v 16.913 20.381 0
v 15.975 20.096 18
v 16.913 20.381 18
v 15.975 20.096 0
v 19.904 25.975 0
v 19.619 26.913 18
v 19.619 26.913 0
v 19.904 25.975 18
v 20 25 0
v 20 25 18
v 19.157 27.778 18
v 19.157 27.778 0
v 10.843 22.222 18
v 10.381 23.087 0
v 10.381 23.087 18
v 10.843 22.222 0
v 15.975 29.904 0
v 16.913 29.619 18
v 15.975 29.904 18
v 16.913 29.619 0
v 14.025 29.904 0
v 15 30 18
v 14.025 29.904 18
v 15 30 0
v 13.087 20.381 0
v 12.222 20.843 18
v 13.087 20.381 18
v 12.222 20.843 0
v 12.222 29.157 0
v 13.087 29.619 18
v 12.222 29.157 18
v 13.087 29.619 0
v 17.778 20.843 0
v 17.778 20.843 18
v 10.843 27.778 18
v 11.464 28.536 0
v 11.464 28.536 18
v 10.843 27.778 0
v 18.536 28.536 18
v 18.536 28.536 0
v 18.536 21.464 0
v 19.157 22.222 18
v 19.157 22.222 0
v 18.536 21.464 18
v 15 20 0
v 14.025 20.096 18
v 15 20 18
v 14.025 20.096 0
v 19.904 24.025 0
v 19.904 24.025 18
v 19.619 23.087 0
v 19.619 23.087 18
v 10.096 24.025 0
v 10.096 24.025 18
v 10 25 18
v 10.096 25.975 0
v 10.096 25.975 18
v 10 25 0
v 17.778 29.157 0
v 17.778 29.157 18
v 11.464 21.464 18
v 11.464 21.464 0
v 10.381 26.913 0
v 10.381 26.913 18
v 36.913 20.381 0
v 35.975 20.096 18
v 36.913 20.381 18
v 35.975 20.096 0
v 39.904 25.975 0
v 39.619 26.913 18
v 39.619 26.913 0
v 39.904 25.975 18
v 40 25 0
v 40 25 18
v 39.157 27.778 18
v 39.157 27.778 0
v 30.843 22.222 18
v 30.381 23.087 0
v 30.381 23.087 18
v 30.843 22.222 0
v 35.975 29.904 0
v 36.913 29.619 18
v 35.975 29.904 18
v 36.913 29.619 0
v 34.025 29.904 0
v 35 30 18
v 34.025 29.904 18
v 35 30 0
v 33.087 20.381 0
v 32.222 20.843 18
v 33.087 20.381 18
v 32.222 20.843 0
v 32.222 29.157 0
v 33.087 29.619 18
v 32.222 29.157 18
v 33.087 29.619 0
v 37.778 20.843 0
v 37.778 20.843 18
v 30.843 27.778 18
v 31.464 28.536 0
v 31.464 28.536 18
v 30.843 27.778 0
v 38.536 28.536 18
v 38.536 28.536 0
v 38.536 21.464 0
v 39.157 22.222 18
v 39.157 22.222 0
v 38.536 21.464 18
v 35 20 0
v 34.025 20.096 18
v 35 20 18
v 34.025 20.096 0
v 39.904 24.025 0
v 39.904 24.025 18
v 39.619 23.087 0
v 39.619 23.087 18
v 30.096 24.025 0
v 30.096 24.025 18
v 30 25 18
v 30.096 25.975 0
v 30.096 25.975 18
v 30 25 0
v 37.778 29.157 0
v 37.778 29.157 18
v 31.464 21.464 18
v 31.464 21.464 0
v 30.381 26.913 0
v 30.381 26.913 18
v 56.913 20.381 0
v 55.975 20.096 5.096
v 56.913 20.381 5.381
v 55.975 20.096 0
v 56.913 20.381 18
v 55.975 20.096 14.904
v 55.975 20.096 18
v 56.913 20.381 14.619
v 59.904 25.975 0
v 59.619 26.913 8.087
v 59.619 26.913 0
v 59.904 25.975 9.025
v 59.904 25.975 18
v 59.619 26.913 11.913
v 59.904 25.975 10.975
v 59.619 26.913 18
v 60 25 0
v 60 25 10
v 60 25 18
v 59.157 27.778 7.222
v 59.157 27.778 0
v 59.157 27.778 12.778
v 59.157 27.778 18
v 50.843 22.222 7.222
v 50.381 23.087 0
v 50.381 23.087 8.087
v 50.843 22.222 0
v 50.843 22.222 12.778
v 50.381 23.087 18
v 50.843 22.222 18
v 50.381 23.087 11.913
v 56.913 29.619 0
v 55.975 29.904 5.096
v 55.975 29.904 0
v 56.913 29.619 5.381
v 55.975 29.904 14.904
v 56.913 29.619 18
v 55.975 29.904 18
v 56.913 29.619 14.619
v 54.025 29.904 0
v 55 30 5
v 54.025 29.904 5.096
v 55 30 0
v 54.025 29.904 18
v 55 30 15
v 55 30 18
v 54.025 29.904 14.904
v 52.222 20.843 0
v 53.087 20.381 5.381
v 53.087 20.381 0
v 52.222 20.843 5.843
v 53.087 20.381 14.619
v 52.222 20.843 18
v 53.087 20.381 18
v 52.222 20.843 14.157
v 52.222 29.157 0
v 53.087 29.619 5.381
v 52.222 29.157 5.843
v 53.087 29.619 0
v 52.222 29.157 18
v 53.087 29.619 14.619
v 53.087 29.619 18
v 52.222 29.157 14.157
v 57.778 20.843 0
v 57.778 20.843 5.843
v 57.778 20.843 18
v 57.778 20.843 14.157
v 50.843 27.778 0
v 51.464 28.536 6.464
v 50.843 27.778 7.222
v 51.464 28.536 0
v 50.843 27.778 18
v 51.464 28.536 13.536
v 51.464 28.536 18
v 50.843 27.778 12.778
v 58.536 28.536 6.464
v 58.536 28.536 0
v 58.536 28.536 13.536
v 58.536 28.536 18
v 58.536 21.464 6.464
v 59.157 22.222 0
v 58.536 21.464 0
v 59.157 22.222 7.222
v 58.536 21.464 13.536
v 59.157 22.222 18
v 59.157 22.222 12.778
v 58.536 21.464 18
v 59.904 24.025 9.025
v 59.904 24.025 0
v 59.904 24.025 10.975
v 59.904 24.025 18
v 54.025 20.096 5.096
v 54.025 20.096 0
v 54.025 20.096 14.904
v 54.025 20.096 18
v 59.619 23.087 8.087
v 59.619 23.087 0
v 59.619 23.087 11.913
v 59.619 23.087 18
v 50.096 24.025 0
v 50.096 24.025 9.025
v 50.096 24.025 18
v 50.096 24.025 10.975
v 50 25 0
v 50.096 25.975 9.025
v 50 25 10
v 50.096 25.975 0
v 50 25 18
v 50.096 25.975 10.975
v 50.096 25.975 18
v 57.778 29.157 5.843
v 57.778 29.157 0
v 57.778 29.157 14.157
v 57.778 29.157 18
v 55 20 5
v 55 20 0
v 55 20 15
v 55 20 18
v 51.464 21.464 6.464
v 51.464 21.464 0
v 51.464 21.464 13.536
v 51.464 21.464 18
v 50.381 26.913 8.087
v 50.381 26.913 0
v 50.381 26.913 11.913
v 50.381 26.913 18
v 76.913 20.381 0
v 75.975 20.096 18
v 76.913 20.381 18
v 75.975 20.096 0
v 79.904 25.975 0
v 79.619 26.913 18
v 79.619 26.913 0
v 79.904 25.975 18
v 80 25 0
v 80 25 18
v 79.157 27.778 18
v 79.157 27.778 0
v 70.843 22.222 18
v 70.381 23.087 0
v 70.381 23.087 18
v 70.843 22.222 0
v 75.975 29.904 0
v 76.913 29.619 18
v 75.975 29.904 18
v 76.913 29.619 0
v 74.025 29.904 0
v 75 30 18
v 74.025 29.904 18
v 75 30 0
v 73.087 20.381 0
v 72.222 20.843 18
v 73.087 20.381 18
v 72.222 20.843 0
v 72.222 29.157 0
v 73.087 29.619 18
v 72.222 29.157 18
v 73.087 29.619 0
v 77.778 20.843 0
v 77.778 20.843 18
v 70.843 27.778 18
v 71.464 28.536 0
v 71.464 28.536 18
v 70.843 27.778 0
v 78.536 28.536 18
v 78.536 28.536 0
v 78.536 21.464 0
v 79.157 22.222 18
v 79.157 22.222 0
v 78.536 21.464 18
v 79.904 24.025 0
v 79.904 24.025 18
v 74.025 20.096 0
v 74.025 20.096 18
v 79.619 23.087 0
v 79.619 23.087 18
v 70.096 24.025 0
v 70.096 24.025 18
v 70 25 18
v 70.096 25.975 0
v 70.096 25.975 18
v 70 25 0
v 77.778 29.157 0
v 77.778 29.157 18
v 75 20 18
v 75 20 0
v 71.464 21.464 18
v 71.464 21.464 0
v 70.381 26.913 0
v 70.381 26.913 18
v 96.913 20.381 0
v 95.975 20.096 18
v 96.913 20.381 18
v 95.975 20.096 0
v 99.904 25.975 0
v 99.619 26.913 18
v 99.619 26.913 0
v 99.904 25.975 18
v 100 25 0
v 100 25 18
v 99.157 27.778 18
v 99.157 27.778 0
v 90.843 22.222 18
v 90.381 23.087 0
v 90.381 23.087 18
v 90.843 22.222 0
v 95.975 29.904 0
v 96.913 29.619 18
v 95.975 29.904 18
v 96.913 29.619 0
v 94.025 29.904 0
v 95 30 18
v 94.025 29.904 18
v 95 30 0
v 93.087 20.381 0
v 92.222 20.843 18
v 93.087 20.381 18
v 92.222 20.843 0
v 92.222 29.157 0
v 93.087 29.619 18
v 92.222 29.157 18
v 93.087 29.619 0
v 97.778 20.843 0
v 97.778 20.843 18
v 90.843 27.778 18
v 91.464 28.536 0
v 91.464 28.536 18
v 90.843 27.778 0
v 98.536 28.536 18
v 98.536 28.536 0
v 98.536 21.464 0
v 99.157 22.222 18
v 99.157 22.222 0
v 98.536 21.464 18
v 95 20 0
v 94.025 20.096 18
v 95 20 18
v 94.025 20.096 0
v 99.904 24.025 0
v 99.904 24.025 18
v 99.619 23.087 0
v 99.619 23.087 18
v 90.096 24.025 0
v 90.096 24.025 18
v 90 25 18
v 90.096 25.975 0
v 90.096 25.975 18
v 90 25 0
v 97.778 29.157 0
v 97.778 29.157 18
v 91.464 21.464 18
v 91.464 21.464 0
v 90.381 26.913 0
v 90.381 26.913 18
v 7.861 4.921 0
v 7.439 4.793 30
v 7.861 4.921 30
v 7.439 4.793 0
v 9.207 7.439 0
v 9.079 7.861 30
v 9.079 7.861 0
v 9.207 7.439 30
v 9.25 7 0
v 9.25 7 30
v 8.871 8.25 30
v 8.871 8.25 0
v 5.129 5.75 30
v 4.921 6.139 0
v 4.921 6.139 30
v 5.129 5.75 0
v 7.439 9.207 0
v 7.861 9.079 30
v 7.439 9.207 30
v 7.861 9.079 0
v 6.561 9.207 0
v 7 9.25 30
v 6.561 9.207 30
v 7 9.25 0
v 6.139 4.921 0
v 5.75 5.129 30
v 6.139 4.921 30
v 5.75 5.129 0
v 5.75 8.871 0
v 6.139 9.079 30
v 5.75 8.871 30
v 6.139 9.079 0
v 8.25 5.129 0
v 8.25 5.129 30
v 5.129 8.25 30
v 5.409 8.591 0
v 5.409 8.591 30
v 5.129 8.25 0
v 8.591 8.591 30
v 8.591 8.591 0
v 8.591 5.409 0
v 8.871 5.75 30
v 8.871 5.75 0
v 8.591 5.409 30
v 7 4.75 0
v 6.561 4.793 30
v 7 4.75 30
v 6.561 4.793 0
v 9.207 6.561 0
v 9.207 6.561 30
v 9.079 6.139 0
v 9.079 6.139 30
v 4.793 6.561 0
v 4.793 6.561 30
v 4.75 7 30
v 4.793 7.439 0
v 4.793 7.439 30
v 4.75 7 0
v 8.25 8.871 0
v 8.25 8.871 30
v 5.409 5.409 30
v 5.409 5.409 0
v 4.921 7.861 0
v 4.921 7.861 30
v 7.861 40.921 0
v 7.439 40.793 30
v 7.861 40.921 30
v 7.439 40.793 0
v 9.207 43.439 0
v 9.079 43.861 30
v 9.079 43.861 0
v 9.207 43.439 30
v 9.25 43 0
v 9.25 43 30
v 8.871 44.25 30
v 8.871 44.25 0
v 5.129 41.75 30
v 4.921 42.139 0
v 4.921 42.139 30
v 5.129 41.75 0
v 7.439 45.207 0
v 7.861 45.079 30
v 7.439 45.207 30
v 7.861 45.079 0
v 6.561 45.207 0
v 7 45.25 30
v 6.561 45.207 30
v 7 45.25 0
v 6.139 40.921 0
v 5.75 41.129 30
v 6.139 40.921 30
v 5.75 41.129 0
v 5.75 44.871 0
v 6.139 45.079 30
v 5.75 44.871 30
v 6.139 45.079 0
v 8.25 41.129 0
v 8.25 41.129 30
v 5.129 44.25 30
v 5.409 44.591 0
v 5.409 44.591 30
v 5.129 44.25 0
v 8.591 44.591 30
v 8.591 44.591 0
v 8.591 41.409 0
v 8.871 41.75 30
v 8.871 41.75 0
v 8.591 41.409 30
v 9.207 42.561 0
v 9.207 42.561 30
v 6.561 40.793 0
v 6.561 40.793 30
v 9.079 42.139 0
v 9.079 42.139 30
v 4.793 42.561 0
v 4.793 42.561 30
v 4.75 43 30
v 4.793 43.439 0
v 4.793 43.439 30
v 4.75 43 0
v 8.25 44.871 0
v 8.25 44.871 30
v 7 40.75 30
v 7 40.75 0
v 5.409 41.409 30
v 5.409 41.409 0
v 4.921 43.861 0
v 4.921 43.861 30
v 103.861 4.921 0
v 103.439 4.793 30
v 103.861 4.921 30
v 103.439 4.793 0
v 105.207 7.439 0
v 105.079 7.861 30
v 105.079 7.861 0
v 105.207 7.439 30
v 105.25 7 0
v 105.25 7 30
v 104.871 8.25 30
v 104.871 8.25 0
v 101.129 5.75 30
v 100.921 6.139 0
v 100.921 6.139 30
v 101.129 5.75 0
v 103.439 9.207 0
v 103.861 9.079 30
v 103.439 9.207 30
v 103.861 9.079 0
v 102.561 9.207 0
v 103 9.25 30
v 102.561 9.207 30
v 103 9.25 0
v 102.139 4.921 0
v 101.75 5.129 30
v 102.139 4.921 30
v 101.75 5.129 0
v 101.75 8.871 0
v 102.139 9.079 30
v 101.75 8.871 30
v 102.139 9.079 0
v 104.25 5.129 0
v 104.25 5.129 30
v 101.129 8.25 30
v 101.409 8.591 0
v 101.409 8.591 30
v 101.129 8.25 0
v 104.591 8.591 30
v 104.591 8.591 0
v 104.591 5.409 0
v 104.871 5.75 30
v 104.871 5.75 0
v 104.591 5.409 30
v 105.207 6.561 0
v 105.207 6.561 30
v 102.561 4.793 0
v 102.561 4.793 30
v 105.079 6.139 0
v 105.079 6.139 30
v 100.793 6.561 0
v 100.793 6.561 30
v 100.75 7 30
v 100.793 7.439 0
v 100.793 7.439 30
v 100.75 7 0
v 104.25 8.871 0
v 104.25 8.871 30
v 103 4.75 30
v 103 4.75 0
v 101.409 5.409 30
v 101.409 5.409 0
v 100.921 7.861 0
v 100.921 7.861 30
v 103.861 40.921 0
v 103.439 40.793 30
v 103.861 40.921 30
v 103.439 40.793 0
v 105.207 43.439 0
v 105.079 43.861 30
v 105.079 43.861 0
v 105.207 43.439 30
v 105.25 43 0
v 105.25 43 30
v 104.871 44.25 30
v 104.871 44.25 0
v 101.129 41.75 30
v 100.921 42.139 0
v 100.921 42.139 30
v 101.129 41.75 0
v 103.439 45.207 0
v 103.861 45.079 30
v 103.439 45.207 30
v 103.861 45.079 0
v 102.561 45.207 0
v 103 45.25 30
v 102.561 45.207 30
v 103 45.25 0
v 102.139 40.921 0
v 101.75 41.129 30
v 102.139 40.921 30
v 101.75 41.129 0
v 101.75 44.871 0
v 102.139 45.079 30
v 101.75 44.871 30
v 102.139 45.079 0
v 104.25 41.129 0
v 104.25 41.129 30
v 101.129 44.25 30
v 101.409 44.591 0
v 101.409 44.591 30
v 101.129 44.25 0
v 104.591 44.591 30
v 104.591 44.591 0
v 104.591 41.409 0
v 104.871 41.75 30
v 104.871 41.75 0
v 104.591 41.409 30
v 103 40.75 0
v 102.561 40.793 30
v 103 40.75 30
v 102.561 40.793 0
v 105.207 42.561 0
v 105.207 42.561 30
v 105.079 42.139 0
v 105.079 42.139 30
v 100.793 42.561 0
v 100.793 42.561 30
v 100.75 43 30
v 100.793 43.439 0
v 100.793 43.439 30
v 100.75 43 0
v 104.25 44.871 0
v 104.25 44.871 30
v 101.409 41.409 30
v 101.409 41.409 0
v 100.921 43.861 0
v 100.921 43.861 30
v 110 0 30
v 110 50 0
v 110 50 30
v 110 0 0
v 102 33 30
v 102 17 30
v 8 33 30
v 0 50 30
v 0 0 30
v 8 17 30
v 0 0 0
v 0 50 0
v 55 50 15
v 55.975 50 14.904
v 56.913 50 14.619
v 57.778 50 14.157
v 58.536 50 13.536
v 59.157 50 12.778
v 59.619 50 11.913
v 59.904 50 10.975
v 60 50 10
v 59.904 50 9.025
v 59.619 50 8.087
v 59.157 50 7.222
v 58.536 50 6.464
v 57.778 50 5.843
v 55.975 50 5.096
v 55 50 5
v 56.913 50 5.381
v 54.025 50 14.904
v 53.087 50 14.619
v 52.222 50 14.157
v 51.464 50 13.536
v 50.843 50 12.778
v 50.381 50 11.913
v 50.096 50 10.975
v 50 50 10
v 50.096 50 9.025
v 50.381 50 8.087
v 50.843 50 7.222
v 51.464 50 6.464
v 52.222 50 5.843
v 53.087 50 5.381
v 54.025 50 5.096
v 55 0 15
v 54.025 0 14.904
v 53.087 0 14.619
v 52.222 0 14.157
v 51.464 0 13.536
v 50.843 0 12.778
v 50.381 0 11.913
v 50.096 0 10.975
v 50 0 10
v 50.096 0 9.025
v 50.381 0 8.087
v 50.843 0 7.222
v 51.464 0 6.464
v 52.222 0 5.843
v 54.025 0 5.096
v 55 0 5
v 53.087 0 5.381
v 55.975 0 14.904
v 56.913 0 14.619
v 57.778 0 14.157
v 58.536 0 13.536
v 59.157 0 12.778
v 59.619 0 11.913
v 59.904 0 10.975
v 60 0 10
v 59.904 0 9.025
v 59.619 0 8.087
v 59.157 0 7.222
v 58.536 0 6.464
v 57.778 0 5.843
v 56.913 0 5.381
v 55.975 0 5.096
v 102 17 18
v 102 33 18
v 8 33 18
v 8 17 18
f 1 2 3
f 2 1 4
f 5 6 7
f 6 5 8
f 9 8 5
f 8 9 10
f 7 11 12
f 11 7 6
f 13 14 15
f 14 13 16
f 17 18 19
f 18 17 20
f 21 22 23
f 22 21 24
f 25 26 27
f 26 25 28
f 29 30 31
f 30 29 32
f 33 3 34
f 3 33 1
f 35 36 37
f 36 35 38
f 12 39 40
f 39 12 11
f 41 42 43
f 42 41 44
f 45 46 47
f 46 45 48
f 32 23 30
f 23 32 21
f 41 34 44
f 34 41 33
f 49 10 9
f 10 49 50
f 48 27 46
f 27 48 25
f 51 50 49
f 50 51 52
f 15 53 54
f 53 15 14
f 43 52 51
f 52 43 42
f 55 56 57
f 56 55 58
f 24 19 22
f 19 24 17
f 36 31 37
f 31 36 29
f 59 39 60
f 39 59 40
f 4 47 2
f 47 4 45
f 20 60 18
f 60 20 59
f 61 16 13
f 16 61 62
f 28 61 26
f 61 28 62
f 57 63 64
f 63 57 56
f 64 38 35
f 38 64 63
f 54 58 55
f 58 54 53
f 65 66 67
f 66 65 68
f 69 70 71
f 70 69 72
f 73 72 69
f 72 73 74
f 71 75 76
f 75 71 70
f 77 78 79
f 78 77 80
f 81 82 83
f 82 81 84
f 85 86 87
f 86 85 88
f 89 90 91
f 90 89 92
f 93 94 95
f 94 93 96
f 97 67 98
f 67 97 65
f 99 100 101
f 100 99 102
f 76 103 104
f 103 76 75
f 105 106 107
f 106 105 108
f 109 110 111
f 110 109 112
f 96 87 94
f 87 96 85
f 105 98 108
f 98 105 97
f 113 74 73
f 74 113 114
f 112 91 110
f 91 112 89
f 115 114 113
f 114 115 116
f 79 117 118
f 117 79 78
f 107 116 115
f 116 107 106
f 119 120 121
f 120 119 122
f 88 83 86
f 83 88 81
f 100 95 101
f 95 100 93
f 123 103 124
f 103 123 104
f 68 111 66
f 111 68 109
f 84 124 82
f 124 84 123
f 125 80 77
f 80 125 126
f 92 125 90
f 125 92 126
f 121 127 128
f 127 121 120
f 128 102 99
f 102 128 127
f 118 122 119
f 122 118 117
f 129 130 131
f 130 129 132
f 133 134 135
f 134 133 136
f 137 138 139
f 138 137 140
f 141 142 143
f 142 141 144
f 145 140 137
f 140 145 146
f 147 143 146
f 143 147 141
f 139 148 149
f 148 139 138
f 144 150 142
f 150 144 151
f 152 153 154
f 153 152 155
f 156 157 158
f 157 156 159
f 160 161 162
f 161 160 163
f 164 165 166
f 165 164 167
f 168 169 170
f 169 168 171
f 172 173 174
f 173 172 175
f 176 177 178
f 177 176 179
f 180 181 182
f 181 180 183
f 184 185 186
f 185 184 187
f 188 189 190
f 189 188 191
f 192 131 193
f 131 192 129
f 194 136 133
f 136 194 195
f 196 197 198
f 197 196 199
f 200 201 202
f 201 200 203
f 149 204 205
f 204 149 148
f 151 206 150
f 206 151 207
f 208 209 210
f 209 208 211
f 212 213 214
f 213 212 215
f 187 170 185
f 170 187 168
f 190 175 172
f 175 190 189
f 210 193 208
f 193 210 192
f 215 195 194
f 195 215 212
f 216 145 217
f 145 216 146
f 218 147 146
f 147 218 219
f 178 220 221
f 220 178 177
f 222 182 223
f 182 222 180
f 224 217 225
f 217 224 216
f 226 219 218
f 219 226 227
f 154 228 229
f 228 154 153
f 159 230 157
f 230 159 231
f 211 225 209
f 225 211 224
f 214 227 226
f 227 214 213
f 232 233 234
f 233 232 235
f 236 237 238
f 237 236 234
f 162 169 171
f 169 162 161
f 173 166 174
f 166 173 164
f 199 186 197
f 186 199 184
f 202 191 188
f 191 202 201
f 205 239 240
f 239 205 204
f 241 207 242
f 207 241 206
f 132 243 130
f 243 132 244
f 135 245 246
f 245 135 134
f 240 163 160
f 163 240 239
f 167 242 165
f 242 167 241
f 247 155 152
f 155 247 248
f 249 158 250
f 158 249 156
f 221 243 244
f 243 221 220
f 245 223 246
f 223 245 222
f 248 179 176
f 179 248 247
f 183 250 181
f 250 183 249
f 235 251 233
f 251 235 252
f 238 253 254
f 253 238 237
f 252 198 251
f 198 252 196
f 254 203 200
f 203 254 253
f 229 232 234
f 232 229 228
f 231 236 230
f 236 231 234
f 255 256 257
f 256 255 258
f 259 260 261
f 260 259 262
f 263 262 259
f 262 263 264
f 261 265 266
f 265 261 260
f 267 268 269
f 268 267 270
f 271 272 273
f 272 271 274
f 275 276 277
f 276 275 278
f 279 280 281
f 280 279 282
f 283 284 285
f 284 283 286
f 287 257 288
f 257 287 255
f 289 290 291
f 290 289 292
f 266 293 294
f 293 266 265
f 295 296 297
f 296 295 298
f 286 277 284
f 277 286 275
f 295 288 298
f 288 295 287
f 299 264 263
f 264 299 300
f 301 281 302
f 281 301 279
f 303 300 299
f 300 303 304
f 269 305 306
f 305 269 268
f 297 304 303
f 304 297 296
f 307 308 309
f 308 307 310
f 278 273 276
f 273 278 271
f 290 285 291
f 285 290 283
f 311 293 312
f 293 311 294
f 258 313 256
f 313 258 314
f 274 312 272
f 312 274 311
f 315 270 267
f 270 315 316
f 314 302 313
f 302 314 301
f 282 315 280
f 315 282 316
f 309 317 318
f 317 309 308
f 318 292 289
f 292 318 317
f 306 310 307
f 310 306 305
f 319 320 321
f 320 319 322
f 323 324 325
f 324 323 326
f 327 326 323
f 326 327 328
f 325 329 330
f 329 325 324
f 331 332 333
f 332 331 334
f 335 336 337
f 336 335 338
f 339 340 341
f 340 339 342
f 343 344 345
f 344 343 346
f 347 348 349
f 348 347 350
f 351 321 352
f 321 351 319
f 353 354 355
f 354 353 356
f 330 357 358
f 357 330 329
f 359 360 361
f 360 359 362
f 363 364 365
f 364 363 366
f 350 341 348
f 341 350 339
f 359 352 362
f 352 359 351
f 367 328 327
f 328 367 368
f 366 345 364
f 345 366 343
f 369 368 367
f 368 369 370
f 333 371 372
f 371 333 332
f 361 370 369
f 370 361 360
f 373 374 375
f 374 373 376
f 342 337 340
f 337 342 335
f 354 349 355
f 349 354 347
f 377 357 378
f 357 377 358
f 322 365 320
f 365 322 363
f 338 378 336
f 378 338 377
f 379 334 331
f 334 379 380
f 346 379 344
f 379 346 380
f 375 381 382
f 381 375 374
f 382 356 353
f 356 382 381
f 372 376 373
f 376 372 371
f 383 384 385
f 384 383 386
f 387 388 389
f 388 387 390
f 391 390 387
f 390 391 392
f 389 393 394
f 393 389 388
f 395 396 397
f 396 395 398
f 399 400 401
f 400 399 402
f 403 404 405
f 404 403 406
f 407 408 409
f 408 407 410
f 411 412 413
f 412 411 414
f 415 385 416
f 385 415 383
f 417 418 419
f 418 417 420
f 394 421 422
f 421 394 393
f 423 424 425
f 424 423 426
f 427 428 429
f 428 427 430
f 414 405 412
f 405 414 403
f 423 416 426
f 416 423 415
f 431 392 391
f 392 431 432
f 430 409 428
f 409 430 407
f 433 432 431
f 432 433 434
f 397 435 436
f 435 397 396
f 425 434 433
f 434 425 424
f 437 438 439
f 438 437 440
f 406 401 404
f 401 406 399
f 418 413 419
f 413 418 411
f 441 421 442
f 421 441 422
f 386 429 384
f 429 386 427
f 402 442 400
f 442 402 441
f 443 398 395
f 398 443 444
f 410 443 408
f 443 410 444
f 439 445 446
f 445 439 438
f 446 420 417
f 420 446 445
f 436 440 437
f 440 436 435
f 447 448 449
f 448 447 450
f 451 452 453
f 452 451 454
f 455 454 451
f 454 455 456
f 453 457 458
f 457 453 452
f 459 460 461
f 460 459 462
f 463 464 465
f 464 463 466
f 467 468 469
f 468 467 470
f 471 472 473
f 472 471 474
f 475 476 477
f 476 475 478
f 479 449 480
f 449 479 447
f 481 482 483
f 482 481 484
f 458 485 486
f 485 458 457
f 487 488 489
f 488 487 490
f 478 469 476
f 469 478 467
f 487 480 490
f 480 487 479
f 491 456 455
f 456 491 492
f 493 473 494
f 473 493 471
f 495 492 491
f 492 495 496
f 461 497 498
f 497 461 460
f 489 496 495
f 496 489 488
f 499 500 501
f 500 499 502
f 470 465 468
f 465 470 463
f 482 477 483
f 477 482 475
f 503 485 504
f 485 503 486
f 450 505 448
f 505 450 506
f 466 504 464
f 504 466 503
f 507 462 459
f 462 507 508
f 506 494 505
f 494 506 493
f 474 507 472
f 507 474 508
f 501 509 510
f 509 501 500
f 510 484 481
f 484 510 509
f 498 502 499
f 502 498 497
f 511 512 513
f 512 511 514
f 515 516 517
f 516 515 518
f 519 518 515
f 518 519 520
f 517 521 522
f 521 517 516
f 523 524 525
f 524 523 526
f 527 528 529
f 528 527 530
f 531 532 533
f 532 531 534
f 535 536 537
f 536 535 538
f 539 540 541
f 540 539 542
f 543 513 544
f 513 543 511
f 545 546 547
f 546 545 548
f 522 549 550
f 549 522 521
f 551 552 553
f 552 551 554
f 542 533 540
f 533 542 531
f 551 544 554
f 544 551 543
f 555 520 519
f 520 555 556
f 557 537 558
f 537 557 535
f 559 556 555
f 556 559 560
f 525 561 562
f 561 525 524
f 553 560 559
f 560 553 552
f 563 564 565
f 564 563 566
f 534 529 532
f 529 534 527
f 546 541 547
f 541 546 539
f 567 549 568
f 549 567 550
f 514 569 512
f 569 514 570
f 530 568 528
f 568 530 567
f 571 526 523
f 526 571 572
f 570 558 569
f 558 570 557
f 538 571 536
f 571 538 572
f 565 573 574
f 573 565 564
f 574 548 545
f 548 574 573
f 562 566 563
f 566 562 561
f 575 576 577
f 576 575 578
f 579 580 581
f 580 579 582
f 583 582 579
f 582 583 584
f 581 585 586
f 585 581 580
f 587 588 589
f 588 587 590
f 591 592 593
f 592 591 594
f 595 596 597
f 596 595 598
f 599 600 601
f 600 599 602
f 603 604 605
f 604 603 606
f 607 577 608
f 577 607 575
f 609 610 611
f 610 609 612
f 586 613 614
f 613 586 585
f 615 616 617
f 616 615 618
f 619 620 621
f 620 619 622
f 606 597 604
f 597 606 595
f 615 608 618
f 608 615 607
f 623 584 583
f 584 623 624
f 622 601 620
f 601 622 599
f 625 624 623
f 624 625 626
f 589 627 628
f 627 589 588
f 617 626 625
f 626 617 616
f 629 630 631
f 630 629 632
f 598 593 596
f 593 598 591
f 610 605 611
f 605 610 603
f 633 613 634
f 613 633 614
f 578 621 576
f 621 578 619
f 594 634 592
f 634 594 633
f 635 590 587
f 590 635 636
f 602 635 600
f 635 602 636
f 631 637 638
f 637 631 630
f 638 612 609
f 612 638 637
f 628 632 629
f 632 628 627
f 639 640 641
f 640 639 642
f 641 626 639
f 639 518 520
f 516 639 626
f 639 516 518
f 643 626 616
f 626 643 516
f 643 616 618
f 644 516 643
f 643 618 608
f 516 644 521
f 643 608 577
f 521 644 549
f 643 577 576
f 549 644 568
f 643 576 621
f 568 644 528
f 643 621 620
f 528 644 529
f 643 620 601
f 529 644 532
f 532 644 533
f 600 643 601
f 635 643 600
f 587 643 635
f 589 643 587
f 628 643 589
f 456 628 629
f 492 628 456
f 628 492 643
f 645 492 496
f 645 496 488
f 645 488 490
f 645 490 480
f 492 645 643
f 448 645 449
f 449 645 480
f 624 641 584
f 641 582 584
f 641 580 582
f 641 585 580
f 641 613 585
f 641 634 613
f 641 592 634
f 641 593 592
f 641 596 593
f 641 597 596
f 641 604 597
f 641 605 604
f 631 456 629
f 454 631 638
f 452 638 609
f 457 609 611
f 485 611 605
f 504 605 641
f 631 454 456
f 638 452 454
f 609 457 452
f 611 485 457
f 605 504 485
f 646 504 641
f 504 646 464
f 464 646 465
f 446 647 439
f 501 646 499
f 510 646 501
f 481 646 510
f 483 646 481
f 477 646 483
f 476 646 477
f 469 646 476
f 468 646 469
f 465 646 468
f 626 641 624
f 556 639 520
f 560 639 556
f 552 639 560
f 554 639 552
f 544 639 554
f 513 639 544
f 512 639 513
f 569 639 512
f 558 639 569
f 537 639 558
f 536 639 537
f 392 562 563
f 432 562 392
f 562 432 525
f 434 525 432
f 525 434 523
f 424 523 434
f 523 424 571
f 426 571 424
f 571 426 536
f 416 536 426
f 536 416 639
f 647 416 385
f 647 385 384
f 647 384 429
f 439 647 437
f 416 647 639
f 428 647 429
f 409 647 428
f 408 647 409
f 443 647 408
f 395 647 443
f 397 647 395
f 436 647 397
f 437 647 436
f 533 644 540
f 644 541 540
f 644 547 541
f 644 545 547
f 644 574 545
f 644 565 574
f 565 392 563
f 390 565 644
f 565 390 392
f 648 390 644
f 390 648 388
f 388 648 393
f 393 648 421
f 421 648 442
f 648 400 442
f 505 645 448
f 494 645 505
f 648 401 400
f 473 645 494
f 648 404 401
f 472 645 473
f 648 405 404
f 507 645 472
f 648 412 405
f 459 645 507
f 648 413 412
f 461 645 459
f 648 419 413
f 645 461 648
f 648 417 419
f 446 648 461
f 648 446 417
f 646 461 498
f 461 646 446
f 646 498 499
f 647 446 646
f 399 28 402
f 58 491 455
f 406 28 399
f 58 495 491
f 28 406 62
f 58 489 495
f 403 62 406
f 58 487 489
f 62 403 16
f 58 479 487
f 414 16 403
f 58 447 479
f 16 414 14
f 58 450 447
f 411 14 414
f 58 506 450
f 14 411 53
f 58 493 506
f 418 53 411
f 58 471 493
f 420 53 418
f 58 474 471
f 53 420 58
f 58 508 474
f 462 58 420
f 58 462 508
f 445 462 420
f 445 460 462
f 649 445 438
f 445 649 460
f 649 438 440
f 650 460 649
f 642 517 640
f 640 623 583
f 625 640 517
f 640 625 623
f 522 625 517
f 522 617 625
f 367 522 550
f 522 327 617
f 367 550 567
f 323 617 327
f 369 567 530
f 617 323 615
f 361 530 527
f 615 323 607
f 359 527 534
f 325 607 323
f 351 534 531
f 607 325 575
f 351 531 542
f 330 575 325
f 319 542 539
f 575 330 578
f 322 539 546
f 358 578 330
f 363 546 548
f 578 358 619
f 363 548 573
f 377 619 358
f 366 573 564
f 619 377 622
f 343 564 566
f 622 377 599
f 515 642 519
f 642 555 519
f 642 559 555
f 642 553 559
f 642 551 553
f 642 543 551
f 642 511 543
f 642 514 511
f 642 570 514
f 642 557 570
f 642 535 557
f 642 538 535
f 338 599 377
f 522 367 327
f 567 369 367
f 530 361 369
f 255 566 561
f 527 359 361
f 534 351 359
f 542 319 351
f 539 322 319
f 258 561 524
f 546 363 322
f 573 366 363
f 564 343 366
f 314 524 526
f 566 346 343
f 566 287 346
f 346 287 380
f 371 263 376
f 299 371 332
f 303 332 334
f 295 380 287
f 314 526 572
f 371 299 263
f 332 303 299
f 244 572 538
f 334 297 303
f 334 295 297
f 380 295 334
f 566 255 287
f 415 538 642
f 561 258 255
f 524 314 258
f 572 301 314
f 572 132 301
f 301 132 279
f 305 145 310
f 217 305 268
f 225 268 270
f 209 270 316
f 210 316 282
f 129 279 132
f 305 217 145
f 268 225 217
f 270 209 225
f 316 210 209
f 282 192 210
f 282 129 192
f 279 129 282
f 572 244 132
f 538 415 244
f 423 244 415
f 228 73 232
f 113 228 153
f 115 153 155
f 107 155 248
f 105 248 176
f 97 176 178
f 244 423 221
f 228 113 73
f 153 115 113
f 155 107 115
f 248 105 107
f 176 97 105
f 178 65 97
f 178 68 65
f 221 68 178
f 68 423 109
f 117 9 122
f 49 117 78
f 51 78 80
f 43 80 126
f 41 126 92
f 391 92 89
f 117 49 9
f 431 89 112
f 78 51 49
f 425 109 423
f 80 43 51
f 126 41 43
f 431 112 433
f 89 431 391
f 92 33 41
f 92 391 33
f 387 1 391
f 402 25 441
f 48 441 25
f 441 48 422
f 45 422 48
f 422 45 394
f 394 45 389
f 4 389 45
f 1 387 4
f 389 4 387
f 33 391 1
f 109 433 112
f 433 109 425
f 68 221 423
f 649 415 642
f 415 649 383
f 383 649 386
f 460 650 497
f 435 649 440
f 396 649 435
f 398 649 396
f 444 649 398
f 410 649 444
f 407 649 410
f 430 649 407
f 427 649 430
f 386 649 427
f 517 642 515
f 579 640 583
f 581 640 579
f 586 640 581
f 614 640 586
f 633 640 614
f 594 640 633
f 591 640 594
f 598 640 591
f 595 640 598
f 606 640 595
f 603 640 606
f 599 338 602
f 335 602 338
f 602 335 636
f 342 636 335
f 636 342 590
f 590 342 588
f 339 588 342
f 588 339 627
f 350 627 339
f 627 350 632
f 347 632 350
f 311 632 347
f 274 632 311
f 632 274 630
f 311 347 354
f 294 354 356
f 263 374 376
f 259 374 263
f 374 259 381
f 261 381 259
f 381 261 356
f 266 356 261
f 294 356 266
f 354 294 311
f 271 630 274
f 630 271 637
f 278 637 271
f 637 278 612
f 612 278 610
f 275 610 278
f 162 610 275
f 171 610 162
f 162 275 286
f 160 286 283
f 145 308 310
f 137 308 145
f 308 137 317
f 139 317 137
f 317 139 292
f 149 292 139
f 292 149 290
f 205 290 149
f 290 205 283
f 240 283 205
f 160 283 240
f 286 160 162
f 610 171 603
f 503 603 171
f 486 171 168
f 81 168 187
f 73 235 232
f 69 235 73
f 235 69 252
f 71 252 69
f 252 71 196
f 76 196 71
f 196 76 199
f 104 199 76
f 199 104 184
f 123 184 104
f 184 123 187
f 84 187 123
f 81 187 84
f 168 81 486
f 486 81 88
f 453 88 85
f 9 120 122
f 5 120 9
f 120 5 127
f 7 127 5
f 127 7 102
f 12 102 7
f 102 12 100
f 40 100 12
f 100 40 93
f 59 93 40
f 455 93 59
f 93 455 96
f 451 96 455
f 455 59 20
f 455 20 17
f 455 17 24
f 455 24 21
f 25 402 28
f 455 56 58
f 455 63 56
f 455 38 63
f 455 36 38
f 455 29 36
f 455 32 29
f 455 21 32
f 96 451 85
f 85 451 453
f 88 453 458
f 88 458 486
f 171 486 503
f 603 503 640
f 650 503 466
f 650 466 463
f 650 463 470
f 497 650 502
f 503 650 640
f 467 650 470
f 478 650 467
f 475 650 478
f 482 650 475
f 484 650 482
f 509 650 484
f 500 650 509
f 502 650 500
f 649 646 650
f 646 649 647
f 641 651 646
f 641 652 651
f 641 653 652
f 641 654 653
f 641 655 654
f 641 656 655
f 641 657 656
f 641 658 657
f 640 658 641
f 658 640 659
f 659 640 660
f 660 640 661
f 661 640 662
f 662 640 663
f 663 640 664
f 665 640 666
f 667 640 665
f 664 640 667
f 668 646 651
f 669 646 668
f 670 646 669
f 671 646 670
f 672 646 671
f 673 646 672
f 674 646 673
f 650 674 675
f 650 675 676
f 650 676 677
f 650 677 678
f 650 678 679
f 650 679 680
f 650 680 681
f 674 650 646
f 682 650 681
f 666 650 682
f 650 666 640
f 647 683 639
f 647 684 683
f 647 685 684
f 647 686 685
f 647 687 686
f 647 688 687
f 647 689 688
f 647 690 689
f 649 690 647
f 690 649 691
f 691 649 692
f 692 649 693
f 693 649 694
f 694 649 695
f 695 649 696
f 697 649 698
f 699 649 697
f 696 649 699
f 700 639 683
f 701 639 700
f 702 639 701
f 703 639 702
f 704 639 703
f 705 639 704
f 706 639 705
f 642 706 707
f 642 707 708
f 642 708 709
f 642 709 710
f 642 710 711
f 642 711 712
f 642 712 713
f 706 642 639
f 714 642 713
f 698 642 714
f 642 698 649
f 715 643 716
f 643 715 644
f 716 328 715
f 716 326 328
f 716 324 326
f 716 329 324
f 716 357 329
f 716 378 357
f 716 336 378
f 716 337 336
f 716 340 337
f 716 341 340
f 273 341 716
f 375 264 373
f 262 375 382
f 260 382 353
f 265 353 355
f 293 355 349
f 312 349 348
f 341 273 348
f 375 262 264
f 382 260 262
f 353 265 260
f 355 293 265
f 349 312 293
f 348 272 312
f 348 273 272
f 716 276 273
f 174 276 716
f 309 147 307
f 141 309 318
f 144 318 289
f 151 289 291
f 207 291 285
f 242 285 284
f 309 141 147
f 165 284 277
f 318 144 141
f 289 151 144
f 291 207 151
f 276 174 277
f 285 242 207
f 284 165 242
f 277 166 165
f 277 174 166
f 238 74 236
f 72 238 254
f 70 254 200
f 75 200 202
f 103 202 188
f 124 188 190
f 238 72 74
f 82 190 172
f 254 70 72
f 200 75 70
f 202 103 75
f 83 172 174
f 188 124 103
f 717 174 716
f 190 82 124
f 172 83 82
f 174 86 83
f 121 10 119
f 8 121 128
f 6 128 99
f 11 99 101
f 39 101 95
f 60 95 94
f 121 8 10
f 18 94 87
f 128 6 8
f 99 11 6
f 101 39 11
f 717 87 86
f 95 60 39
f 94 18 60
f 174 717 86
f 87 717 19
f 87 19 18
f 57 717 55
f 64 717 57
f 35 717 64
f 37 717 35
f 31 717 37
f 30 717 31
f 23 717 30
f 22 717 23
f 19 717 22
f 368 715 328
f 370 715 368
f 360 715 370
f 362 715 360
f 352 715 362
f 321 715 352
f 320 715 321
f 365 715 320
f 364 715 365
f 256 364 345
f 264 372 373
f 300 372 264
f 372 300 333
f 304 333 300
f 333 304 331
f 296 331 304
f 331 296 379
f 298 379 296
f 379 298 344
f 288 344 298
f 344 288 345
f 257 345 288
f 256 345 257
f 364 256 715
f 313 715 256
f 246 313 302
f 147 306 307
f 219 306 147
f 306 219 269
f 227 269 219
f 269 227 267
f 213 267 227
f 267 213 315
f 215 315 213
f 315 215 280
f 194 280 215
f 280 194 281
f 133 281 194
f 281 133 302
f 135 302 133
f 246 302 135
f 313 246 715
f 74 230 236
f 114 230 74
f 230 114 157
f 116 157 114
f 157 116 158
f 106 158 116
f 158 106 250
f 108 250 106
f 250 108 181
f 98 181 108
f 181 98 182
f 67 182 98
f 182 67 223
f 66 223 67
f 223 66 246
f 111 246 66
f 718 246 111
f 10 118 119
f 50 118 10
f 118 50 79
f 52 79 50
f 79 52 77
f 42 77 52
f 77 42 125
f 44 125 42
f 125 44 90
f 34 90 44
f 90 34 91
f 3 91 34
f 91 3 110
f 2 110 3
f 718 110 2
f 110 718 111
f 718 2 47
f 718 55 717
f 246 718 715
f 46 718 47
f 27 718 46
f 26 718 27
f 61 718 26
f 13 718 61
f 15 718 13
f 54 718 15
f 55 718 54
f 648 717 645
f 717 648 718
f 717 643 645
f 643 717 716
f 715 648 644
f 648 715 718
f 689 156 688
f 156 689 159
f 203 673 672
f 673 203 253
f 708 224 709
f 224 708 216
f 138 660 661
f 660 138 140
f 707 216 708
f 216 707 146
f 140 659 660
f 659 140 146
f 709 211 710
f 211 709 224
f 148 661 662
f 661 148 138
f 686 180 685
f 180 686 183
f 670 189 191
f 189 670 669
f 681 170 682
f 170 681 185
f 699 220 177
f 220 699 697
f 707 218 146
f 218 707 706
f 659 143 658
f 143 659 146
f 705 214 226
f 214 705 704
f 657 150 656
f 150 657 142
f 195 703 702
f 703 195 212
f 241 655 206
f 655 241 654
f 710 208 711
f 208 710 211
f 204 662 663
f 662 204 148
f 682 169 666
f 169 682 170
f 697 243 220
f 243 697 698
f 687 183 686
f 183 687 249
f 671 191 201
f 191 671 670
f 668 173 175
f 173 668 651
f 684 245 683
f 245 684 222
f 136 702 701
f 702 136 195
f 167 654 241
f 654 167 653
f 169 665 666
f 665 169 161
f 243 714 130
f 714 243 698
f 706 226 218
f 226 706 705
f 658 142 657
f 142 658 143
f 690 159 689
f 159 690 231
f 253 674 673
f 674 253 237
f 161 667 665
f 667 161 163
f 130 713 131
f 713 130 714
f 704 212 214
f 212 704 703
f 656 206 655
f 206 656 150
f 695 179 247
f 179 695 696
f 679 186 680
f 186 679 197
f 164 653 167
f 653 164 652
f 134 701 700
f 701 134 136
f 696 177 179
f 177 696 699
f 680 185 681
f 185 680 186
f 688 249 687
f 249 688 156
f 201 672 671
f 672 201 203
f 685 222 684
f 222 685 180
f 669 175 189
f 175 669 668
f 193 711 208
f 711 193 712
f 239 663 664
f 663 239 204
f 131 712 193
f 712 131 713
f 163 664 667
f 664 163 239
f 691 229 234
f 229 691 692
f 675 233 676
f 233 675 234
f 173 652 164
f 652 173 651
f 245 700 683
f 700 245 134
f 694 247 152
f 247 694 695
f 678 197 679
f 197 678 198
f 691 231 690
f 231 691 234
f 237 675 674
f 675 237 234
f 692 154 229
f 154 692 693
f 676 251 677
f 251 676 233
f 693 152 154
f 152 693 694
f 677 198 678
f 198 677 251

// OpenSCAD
$fn = 32;

// ----------------------------------------------------------------------
// Manifold block: side_outlet manifold
// ----------------------------------------------------------------------

// --- parameters (mm) ---
block_l = 110;            // block length, X
block_w = 50;             // block width, Y
block_h = 30;             // block height, Z
port_d = 10;              // port bore diameter
port_pitch = 20;          // port pitch along X
gallery_d = 16;           // top gallery width, Y
gallery_depth = 12;       // gallery pocket depth
wall_p = 8;               // gallery end wall thickness, X
mnt_d = 4.5;              // mounting hole diameter
mnt_in = 7;               // mounting hole inset from the edges
out_d = 10;               // outlet bore diameter
out_z = 10;               // outlet axis height
fit_tol = 0.1;            // tolerance for press fits, mm
free_tol = 0.5;           // tolerance for clearance fits, mm

n_ports = 5;  // ports in the row
port_x0 = (block_l - (n_ports - 1) * port_pitch) / 2;  // first port X

difference() {
  cube([block_l, block_w, block_h]);
  for (i = [0 : n_ports - 1])
    translate([port_x0 + i * port_pitch, block_w / 2, -1])
      cylinder(h = block_h + 2, d = port_d);
  translate([wall_p, block_w / 2 - gallery_d / 2, block_h - gallery_depth])
    cube([block_l - 2 * wall_p, gallery_d, gallery_depth + 1]);
  for (cx = [mnt_in, block_l - mnt_in])
    for (cy = [mnt_in, block_w - mnt_in])
      translate([cx, cy, -1]) cylinder(h = block_h + 2, d = mnt_d);
  translate([block_l / 2, -1, out_z]) rotate([-90, 0, 0])
    cylinder(h = block_w + 2, d = out_d);
}
